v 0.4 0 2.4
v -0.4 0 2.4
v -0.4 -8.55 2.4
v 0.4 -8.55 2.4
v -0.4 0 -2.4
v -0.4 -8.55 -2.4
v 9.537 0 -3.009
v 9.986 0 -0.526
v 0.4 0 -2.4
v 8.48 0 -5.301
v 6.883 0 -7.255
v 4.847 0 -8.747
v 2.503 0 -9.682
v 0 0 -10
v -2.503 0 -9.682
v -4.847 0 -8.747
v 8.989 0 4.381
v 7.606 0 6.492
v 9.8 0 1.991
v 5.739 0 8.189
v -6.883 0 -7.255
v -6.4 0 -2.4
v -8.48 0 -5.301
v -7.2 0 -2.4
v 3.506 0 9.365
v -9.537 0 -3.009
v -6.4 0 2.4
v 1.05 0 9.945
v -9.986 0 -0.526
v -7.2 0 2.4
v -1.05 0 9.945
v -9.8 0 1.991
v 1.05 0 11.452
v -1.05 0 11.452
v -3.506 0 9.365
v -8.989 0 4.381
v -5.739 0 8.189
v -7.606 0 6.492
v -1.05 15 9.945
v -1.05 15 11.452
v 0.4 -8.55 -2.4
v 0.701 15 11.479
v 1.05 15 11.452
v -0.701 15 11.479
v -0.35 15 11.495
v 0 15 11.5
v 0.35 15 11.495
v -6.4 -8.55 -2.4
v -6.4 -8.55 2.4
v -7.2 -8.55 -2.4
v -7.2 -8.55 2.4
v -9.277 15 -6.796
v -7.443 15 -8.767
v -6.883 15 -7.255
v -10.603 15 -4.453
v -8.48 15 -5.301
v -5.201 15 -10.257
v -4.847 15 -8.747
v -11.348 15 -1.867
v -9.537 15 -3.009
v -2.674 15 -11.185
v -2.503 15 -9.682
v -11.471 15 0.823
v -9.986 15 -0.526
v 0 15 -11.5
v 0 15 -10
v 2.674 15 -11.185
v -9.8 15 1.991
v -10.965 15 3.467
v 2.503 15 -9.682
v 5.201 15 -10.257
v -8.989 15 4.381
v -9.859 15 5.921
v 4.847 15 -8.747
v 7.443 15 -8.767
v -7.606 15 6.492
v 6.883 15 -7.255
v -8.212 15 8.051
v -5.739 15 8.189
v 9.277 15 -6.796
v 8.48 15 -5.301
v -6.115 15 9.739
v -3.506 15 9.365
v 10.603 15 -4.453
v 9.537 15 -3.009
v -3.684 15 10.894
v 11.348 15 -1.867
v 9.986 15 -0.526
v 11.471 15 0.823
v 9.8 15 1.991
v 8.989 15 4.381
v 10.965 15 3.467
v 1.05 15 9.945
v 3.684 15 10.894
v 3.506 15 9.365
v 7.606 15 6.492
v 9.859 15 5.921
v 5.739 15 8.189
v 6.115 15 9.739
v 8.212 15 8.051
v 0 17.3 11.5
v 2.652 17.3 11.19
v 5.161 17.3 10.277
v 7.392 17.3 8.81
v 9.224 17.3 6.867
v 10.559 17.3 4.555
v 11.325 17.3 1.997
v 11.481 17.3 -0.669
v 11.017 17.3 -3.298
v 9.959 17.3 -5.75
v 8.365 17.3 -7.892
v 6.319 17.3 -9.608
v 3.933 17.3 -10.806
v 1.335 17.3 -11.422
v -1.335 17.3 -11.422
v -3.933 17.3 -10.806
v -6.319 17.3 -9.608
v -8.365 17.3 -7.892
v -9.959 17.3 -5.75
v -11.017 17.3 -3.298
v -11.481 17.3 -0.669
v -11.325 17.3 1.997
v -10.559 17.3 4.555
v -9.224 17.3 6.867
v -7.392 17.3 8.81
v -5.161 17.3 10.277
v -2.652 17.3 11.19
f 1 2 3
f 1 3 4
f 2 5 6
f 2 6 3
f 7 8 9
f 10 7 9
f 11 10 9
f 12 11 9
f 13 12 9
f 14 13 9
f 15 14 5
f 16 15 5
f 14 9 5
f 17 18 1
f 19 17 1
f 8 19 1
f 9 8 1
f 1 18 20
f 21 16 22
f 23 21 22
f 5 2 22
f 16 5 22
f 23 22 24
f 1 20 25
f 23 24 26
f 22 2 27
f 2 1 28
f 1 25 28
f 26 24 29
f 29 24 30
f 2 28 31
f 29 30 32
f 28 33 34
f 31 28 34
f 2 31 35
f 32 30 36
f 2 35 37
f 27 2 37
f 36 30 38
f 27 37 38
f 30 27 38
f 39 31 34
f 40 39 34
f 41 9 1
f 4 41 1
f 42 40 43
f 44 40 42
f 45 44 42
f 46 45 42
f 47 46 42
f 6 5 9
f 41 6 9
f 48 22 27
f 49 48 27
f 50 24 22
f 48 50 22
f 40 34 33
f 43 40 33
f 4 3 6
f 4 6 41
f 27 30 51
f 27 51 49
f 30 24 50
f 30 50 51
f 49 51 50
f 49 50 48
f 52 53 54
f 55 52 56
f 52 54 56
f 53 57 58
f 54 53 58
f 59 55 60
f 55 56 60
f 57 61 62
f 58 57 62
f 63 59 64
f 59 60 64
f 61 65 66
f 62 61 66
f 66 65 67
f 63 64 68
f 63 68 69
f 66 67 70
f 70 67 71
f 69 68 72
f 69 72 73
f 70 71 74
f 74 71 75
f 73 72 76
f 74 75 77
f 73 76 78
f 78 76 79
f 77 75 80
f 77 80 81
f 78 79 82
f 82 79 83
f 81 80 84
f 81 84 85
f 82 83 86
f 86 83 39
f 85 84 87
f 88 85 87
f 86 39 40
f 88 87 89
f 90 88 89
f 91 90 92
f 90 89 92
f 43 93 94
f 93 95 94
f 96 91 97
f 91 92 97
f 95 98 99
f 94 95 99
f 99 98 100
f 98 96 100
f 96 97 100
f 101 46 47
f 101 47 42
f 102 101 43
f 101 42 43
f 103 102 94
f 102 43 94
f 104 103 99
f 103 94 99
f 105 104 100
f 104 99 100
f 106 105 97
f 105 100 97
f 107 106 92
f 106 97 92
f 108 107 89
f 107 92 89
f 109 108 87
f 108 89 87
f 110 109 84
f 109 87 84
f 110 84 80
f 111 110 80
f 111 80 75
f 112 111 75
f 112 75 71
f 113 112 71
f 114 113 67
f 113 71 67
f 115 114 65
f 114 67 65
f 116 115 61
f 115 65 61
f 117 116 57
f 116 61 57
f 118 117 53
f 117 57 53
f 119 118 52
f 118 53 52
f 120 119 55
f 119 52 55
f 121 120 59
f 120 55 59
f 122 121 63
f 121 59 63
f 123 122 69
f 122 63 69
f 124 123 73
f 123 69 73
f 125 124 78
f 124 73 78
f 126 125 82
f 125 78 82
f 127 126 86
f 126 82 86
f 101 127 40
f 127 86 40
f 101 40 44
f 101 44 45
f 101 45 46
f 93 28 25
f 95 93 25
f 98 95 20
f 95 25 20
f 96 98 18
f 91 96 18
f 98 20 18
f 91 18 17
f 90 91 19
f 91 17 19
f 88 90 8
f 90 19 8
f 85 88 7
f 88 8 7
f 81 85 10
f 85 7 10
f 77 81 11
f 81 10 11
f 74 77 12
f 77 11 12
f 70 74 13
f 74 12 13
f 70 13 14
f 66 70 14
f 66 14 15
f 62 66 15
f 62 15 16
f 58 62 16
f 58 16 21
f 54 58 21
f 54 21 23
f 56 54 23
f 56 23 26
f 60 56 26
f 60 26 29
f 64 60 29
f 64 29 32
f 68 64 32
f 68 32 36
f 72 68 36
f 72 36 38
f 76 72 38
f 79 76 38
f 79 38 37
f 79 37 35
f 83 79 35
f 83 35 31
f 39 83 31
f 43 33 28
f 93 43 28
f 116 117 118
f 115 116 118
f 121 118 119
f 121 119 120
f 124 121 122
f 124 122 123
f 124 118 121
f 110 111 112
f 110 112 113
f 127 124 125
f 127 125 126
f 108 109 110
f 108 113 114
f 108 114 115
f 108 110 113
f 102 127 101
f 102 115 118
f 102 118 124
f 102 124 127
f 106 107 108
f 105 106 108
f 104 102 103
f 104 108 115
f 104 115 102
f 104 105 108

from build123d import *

# Parameters (mm, degrees)
SKETCH2_R           = 10
BOSS_EXTRUDE1_DEPTH = 15
SKETCH3_R           = 11.5
BOSS_EXTRUDE2_DEPTH = 2.3
SKETCH4_W           = 0.8
SKETCH4_H           = 4.8
BOSS_EXTRUDE3_DEPTH = 8.55
BOSS_EXTRUDE4_DEPTH = 15


with BuildPart() as part:
    # Sketch2 → Boss-Extrude1 (new body)
    with BuildSketch(Plane(origin=(0, 0, 0), x_dir=(1, 0, 0), z_dir=(0, 1, 0))):
        with Locations(Location((0, 0, 0), (0, 0, 270))):
            Circle(SKETCH2_R)
    extrude(amount=BOSS_EXTRUDE1_DEPTH)

    # Sketch3 → Boss-Extrude2 (add)
    with BuildSketch(Plane(origin=(0, 15, 0), x_dir=(1, 0, 0), z_dir=(0, 1, 0))):
        with Locations(Location((0, 0, 0), (0, 0, 270))):
            Circle(SKETCH3_R)
    extrude(amount=BOSS_EXTRUDE2_DEPTH)

    # Sketch4 → Boss-Extrude3 (add)
    with BuildSketch(Plane.XZ):
        Rectangle(SKETCH4_W, SKETCH4_H)
        with Locations((-6.8, 0)):
            Rectangle(SKETCH4_W, SKETCH4_H)
    extrude(amount=BOSS_EXTRUDE3_DEPTH)

    # Sketch5 → Boss-Extrude4 (add)
    with BuildSketch(Plane.XZ):
        with BuildLine():
            Line((-1.05, 9.944722218), (-1.05, 11.451964897))
            Line((-1.05, 11.451964897), (1.05, 11.451964897))
            Line((1.05, 11.451964897), (1.05, 9.944722218))
            ThreePointArc((1.05, 9.944722218), (0, 10), (-1.05, 9.944722218))
        make_face()
    extrude(amount=-BOSS_EXTRUDE4_DEPTH)


solid = part.part
